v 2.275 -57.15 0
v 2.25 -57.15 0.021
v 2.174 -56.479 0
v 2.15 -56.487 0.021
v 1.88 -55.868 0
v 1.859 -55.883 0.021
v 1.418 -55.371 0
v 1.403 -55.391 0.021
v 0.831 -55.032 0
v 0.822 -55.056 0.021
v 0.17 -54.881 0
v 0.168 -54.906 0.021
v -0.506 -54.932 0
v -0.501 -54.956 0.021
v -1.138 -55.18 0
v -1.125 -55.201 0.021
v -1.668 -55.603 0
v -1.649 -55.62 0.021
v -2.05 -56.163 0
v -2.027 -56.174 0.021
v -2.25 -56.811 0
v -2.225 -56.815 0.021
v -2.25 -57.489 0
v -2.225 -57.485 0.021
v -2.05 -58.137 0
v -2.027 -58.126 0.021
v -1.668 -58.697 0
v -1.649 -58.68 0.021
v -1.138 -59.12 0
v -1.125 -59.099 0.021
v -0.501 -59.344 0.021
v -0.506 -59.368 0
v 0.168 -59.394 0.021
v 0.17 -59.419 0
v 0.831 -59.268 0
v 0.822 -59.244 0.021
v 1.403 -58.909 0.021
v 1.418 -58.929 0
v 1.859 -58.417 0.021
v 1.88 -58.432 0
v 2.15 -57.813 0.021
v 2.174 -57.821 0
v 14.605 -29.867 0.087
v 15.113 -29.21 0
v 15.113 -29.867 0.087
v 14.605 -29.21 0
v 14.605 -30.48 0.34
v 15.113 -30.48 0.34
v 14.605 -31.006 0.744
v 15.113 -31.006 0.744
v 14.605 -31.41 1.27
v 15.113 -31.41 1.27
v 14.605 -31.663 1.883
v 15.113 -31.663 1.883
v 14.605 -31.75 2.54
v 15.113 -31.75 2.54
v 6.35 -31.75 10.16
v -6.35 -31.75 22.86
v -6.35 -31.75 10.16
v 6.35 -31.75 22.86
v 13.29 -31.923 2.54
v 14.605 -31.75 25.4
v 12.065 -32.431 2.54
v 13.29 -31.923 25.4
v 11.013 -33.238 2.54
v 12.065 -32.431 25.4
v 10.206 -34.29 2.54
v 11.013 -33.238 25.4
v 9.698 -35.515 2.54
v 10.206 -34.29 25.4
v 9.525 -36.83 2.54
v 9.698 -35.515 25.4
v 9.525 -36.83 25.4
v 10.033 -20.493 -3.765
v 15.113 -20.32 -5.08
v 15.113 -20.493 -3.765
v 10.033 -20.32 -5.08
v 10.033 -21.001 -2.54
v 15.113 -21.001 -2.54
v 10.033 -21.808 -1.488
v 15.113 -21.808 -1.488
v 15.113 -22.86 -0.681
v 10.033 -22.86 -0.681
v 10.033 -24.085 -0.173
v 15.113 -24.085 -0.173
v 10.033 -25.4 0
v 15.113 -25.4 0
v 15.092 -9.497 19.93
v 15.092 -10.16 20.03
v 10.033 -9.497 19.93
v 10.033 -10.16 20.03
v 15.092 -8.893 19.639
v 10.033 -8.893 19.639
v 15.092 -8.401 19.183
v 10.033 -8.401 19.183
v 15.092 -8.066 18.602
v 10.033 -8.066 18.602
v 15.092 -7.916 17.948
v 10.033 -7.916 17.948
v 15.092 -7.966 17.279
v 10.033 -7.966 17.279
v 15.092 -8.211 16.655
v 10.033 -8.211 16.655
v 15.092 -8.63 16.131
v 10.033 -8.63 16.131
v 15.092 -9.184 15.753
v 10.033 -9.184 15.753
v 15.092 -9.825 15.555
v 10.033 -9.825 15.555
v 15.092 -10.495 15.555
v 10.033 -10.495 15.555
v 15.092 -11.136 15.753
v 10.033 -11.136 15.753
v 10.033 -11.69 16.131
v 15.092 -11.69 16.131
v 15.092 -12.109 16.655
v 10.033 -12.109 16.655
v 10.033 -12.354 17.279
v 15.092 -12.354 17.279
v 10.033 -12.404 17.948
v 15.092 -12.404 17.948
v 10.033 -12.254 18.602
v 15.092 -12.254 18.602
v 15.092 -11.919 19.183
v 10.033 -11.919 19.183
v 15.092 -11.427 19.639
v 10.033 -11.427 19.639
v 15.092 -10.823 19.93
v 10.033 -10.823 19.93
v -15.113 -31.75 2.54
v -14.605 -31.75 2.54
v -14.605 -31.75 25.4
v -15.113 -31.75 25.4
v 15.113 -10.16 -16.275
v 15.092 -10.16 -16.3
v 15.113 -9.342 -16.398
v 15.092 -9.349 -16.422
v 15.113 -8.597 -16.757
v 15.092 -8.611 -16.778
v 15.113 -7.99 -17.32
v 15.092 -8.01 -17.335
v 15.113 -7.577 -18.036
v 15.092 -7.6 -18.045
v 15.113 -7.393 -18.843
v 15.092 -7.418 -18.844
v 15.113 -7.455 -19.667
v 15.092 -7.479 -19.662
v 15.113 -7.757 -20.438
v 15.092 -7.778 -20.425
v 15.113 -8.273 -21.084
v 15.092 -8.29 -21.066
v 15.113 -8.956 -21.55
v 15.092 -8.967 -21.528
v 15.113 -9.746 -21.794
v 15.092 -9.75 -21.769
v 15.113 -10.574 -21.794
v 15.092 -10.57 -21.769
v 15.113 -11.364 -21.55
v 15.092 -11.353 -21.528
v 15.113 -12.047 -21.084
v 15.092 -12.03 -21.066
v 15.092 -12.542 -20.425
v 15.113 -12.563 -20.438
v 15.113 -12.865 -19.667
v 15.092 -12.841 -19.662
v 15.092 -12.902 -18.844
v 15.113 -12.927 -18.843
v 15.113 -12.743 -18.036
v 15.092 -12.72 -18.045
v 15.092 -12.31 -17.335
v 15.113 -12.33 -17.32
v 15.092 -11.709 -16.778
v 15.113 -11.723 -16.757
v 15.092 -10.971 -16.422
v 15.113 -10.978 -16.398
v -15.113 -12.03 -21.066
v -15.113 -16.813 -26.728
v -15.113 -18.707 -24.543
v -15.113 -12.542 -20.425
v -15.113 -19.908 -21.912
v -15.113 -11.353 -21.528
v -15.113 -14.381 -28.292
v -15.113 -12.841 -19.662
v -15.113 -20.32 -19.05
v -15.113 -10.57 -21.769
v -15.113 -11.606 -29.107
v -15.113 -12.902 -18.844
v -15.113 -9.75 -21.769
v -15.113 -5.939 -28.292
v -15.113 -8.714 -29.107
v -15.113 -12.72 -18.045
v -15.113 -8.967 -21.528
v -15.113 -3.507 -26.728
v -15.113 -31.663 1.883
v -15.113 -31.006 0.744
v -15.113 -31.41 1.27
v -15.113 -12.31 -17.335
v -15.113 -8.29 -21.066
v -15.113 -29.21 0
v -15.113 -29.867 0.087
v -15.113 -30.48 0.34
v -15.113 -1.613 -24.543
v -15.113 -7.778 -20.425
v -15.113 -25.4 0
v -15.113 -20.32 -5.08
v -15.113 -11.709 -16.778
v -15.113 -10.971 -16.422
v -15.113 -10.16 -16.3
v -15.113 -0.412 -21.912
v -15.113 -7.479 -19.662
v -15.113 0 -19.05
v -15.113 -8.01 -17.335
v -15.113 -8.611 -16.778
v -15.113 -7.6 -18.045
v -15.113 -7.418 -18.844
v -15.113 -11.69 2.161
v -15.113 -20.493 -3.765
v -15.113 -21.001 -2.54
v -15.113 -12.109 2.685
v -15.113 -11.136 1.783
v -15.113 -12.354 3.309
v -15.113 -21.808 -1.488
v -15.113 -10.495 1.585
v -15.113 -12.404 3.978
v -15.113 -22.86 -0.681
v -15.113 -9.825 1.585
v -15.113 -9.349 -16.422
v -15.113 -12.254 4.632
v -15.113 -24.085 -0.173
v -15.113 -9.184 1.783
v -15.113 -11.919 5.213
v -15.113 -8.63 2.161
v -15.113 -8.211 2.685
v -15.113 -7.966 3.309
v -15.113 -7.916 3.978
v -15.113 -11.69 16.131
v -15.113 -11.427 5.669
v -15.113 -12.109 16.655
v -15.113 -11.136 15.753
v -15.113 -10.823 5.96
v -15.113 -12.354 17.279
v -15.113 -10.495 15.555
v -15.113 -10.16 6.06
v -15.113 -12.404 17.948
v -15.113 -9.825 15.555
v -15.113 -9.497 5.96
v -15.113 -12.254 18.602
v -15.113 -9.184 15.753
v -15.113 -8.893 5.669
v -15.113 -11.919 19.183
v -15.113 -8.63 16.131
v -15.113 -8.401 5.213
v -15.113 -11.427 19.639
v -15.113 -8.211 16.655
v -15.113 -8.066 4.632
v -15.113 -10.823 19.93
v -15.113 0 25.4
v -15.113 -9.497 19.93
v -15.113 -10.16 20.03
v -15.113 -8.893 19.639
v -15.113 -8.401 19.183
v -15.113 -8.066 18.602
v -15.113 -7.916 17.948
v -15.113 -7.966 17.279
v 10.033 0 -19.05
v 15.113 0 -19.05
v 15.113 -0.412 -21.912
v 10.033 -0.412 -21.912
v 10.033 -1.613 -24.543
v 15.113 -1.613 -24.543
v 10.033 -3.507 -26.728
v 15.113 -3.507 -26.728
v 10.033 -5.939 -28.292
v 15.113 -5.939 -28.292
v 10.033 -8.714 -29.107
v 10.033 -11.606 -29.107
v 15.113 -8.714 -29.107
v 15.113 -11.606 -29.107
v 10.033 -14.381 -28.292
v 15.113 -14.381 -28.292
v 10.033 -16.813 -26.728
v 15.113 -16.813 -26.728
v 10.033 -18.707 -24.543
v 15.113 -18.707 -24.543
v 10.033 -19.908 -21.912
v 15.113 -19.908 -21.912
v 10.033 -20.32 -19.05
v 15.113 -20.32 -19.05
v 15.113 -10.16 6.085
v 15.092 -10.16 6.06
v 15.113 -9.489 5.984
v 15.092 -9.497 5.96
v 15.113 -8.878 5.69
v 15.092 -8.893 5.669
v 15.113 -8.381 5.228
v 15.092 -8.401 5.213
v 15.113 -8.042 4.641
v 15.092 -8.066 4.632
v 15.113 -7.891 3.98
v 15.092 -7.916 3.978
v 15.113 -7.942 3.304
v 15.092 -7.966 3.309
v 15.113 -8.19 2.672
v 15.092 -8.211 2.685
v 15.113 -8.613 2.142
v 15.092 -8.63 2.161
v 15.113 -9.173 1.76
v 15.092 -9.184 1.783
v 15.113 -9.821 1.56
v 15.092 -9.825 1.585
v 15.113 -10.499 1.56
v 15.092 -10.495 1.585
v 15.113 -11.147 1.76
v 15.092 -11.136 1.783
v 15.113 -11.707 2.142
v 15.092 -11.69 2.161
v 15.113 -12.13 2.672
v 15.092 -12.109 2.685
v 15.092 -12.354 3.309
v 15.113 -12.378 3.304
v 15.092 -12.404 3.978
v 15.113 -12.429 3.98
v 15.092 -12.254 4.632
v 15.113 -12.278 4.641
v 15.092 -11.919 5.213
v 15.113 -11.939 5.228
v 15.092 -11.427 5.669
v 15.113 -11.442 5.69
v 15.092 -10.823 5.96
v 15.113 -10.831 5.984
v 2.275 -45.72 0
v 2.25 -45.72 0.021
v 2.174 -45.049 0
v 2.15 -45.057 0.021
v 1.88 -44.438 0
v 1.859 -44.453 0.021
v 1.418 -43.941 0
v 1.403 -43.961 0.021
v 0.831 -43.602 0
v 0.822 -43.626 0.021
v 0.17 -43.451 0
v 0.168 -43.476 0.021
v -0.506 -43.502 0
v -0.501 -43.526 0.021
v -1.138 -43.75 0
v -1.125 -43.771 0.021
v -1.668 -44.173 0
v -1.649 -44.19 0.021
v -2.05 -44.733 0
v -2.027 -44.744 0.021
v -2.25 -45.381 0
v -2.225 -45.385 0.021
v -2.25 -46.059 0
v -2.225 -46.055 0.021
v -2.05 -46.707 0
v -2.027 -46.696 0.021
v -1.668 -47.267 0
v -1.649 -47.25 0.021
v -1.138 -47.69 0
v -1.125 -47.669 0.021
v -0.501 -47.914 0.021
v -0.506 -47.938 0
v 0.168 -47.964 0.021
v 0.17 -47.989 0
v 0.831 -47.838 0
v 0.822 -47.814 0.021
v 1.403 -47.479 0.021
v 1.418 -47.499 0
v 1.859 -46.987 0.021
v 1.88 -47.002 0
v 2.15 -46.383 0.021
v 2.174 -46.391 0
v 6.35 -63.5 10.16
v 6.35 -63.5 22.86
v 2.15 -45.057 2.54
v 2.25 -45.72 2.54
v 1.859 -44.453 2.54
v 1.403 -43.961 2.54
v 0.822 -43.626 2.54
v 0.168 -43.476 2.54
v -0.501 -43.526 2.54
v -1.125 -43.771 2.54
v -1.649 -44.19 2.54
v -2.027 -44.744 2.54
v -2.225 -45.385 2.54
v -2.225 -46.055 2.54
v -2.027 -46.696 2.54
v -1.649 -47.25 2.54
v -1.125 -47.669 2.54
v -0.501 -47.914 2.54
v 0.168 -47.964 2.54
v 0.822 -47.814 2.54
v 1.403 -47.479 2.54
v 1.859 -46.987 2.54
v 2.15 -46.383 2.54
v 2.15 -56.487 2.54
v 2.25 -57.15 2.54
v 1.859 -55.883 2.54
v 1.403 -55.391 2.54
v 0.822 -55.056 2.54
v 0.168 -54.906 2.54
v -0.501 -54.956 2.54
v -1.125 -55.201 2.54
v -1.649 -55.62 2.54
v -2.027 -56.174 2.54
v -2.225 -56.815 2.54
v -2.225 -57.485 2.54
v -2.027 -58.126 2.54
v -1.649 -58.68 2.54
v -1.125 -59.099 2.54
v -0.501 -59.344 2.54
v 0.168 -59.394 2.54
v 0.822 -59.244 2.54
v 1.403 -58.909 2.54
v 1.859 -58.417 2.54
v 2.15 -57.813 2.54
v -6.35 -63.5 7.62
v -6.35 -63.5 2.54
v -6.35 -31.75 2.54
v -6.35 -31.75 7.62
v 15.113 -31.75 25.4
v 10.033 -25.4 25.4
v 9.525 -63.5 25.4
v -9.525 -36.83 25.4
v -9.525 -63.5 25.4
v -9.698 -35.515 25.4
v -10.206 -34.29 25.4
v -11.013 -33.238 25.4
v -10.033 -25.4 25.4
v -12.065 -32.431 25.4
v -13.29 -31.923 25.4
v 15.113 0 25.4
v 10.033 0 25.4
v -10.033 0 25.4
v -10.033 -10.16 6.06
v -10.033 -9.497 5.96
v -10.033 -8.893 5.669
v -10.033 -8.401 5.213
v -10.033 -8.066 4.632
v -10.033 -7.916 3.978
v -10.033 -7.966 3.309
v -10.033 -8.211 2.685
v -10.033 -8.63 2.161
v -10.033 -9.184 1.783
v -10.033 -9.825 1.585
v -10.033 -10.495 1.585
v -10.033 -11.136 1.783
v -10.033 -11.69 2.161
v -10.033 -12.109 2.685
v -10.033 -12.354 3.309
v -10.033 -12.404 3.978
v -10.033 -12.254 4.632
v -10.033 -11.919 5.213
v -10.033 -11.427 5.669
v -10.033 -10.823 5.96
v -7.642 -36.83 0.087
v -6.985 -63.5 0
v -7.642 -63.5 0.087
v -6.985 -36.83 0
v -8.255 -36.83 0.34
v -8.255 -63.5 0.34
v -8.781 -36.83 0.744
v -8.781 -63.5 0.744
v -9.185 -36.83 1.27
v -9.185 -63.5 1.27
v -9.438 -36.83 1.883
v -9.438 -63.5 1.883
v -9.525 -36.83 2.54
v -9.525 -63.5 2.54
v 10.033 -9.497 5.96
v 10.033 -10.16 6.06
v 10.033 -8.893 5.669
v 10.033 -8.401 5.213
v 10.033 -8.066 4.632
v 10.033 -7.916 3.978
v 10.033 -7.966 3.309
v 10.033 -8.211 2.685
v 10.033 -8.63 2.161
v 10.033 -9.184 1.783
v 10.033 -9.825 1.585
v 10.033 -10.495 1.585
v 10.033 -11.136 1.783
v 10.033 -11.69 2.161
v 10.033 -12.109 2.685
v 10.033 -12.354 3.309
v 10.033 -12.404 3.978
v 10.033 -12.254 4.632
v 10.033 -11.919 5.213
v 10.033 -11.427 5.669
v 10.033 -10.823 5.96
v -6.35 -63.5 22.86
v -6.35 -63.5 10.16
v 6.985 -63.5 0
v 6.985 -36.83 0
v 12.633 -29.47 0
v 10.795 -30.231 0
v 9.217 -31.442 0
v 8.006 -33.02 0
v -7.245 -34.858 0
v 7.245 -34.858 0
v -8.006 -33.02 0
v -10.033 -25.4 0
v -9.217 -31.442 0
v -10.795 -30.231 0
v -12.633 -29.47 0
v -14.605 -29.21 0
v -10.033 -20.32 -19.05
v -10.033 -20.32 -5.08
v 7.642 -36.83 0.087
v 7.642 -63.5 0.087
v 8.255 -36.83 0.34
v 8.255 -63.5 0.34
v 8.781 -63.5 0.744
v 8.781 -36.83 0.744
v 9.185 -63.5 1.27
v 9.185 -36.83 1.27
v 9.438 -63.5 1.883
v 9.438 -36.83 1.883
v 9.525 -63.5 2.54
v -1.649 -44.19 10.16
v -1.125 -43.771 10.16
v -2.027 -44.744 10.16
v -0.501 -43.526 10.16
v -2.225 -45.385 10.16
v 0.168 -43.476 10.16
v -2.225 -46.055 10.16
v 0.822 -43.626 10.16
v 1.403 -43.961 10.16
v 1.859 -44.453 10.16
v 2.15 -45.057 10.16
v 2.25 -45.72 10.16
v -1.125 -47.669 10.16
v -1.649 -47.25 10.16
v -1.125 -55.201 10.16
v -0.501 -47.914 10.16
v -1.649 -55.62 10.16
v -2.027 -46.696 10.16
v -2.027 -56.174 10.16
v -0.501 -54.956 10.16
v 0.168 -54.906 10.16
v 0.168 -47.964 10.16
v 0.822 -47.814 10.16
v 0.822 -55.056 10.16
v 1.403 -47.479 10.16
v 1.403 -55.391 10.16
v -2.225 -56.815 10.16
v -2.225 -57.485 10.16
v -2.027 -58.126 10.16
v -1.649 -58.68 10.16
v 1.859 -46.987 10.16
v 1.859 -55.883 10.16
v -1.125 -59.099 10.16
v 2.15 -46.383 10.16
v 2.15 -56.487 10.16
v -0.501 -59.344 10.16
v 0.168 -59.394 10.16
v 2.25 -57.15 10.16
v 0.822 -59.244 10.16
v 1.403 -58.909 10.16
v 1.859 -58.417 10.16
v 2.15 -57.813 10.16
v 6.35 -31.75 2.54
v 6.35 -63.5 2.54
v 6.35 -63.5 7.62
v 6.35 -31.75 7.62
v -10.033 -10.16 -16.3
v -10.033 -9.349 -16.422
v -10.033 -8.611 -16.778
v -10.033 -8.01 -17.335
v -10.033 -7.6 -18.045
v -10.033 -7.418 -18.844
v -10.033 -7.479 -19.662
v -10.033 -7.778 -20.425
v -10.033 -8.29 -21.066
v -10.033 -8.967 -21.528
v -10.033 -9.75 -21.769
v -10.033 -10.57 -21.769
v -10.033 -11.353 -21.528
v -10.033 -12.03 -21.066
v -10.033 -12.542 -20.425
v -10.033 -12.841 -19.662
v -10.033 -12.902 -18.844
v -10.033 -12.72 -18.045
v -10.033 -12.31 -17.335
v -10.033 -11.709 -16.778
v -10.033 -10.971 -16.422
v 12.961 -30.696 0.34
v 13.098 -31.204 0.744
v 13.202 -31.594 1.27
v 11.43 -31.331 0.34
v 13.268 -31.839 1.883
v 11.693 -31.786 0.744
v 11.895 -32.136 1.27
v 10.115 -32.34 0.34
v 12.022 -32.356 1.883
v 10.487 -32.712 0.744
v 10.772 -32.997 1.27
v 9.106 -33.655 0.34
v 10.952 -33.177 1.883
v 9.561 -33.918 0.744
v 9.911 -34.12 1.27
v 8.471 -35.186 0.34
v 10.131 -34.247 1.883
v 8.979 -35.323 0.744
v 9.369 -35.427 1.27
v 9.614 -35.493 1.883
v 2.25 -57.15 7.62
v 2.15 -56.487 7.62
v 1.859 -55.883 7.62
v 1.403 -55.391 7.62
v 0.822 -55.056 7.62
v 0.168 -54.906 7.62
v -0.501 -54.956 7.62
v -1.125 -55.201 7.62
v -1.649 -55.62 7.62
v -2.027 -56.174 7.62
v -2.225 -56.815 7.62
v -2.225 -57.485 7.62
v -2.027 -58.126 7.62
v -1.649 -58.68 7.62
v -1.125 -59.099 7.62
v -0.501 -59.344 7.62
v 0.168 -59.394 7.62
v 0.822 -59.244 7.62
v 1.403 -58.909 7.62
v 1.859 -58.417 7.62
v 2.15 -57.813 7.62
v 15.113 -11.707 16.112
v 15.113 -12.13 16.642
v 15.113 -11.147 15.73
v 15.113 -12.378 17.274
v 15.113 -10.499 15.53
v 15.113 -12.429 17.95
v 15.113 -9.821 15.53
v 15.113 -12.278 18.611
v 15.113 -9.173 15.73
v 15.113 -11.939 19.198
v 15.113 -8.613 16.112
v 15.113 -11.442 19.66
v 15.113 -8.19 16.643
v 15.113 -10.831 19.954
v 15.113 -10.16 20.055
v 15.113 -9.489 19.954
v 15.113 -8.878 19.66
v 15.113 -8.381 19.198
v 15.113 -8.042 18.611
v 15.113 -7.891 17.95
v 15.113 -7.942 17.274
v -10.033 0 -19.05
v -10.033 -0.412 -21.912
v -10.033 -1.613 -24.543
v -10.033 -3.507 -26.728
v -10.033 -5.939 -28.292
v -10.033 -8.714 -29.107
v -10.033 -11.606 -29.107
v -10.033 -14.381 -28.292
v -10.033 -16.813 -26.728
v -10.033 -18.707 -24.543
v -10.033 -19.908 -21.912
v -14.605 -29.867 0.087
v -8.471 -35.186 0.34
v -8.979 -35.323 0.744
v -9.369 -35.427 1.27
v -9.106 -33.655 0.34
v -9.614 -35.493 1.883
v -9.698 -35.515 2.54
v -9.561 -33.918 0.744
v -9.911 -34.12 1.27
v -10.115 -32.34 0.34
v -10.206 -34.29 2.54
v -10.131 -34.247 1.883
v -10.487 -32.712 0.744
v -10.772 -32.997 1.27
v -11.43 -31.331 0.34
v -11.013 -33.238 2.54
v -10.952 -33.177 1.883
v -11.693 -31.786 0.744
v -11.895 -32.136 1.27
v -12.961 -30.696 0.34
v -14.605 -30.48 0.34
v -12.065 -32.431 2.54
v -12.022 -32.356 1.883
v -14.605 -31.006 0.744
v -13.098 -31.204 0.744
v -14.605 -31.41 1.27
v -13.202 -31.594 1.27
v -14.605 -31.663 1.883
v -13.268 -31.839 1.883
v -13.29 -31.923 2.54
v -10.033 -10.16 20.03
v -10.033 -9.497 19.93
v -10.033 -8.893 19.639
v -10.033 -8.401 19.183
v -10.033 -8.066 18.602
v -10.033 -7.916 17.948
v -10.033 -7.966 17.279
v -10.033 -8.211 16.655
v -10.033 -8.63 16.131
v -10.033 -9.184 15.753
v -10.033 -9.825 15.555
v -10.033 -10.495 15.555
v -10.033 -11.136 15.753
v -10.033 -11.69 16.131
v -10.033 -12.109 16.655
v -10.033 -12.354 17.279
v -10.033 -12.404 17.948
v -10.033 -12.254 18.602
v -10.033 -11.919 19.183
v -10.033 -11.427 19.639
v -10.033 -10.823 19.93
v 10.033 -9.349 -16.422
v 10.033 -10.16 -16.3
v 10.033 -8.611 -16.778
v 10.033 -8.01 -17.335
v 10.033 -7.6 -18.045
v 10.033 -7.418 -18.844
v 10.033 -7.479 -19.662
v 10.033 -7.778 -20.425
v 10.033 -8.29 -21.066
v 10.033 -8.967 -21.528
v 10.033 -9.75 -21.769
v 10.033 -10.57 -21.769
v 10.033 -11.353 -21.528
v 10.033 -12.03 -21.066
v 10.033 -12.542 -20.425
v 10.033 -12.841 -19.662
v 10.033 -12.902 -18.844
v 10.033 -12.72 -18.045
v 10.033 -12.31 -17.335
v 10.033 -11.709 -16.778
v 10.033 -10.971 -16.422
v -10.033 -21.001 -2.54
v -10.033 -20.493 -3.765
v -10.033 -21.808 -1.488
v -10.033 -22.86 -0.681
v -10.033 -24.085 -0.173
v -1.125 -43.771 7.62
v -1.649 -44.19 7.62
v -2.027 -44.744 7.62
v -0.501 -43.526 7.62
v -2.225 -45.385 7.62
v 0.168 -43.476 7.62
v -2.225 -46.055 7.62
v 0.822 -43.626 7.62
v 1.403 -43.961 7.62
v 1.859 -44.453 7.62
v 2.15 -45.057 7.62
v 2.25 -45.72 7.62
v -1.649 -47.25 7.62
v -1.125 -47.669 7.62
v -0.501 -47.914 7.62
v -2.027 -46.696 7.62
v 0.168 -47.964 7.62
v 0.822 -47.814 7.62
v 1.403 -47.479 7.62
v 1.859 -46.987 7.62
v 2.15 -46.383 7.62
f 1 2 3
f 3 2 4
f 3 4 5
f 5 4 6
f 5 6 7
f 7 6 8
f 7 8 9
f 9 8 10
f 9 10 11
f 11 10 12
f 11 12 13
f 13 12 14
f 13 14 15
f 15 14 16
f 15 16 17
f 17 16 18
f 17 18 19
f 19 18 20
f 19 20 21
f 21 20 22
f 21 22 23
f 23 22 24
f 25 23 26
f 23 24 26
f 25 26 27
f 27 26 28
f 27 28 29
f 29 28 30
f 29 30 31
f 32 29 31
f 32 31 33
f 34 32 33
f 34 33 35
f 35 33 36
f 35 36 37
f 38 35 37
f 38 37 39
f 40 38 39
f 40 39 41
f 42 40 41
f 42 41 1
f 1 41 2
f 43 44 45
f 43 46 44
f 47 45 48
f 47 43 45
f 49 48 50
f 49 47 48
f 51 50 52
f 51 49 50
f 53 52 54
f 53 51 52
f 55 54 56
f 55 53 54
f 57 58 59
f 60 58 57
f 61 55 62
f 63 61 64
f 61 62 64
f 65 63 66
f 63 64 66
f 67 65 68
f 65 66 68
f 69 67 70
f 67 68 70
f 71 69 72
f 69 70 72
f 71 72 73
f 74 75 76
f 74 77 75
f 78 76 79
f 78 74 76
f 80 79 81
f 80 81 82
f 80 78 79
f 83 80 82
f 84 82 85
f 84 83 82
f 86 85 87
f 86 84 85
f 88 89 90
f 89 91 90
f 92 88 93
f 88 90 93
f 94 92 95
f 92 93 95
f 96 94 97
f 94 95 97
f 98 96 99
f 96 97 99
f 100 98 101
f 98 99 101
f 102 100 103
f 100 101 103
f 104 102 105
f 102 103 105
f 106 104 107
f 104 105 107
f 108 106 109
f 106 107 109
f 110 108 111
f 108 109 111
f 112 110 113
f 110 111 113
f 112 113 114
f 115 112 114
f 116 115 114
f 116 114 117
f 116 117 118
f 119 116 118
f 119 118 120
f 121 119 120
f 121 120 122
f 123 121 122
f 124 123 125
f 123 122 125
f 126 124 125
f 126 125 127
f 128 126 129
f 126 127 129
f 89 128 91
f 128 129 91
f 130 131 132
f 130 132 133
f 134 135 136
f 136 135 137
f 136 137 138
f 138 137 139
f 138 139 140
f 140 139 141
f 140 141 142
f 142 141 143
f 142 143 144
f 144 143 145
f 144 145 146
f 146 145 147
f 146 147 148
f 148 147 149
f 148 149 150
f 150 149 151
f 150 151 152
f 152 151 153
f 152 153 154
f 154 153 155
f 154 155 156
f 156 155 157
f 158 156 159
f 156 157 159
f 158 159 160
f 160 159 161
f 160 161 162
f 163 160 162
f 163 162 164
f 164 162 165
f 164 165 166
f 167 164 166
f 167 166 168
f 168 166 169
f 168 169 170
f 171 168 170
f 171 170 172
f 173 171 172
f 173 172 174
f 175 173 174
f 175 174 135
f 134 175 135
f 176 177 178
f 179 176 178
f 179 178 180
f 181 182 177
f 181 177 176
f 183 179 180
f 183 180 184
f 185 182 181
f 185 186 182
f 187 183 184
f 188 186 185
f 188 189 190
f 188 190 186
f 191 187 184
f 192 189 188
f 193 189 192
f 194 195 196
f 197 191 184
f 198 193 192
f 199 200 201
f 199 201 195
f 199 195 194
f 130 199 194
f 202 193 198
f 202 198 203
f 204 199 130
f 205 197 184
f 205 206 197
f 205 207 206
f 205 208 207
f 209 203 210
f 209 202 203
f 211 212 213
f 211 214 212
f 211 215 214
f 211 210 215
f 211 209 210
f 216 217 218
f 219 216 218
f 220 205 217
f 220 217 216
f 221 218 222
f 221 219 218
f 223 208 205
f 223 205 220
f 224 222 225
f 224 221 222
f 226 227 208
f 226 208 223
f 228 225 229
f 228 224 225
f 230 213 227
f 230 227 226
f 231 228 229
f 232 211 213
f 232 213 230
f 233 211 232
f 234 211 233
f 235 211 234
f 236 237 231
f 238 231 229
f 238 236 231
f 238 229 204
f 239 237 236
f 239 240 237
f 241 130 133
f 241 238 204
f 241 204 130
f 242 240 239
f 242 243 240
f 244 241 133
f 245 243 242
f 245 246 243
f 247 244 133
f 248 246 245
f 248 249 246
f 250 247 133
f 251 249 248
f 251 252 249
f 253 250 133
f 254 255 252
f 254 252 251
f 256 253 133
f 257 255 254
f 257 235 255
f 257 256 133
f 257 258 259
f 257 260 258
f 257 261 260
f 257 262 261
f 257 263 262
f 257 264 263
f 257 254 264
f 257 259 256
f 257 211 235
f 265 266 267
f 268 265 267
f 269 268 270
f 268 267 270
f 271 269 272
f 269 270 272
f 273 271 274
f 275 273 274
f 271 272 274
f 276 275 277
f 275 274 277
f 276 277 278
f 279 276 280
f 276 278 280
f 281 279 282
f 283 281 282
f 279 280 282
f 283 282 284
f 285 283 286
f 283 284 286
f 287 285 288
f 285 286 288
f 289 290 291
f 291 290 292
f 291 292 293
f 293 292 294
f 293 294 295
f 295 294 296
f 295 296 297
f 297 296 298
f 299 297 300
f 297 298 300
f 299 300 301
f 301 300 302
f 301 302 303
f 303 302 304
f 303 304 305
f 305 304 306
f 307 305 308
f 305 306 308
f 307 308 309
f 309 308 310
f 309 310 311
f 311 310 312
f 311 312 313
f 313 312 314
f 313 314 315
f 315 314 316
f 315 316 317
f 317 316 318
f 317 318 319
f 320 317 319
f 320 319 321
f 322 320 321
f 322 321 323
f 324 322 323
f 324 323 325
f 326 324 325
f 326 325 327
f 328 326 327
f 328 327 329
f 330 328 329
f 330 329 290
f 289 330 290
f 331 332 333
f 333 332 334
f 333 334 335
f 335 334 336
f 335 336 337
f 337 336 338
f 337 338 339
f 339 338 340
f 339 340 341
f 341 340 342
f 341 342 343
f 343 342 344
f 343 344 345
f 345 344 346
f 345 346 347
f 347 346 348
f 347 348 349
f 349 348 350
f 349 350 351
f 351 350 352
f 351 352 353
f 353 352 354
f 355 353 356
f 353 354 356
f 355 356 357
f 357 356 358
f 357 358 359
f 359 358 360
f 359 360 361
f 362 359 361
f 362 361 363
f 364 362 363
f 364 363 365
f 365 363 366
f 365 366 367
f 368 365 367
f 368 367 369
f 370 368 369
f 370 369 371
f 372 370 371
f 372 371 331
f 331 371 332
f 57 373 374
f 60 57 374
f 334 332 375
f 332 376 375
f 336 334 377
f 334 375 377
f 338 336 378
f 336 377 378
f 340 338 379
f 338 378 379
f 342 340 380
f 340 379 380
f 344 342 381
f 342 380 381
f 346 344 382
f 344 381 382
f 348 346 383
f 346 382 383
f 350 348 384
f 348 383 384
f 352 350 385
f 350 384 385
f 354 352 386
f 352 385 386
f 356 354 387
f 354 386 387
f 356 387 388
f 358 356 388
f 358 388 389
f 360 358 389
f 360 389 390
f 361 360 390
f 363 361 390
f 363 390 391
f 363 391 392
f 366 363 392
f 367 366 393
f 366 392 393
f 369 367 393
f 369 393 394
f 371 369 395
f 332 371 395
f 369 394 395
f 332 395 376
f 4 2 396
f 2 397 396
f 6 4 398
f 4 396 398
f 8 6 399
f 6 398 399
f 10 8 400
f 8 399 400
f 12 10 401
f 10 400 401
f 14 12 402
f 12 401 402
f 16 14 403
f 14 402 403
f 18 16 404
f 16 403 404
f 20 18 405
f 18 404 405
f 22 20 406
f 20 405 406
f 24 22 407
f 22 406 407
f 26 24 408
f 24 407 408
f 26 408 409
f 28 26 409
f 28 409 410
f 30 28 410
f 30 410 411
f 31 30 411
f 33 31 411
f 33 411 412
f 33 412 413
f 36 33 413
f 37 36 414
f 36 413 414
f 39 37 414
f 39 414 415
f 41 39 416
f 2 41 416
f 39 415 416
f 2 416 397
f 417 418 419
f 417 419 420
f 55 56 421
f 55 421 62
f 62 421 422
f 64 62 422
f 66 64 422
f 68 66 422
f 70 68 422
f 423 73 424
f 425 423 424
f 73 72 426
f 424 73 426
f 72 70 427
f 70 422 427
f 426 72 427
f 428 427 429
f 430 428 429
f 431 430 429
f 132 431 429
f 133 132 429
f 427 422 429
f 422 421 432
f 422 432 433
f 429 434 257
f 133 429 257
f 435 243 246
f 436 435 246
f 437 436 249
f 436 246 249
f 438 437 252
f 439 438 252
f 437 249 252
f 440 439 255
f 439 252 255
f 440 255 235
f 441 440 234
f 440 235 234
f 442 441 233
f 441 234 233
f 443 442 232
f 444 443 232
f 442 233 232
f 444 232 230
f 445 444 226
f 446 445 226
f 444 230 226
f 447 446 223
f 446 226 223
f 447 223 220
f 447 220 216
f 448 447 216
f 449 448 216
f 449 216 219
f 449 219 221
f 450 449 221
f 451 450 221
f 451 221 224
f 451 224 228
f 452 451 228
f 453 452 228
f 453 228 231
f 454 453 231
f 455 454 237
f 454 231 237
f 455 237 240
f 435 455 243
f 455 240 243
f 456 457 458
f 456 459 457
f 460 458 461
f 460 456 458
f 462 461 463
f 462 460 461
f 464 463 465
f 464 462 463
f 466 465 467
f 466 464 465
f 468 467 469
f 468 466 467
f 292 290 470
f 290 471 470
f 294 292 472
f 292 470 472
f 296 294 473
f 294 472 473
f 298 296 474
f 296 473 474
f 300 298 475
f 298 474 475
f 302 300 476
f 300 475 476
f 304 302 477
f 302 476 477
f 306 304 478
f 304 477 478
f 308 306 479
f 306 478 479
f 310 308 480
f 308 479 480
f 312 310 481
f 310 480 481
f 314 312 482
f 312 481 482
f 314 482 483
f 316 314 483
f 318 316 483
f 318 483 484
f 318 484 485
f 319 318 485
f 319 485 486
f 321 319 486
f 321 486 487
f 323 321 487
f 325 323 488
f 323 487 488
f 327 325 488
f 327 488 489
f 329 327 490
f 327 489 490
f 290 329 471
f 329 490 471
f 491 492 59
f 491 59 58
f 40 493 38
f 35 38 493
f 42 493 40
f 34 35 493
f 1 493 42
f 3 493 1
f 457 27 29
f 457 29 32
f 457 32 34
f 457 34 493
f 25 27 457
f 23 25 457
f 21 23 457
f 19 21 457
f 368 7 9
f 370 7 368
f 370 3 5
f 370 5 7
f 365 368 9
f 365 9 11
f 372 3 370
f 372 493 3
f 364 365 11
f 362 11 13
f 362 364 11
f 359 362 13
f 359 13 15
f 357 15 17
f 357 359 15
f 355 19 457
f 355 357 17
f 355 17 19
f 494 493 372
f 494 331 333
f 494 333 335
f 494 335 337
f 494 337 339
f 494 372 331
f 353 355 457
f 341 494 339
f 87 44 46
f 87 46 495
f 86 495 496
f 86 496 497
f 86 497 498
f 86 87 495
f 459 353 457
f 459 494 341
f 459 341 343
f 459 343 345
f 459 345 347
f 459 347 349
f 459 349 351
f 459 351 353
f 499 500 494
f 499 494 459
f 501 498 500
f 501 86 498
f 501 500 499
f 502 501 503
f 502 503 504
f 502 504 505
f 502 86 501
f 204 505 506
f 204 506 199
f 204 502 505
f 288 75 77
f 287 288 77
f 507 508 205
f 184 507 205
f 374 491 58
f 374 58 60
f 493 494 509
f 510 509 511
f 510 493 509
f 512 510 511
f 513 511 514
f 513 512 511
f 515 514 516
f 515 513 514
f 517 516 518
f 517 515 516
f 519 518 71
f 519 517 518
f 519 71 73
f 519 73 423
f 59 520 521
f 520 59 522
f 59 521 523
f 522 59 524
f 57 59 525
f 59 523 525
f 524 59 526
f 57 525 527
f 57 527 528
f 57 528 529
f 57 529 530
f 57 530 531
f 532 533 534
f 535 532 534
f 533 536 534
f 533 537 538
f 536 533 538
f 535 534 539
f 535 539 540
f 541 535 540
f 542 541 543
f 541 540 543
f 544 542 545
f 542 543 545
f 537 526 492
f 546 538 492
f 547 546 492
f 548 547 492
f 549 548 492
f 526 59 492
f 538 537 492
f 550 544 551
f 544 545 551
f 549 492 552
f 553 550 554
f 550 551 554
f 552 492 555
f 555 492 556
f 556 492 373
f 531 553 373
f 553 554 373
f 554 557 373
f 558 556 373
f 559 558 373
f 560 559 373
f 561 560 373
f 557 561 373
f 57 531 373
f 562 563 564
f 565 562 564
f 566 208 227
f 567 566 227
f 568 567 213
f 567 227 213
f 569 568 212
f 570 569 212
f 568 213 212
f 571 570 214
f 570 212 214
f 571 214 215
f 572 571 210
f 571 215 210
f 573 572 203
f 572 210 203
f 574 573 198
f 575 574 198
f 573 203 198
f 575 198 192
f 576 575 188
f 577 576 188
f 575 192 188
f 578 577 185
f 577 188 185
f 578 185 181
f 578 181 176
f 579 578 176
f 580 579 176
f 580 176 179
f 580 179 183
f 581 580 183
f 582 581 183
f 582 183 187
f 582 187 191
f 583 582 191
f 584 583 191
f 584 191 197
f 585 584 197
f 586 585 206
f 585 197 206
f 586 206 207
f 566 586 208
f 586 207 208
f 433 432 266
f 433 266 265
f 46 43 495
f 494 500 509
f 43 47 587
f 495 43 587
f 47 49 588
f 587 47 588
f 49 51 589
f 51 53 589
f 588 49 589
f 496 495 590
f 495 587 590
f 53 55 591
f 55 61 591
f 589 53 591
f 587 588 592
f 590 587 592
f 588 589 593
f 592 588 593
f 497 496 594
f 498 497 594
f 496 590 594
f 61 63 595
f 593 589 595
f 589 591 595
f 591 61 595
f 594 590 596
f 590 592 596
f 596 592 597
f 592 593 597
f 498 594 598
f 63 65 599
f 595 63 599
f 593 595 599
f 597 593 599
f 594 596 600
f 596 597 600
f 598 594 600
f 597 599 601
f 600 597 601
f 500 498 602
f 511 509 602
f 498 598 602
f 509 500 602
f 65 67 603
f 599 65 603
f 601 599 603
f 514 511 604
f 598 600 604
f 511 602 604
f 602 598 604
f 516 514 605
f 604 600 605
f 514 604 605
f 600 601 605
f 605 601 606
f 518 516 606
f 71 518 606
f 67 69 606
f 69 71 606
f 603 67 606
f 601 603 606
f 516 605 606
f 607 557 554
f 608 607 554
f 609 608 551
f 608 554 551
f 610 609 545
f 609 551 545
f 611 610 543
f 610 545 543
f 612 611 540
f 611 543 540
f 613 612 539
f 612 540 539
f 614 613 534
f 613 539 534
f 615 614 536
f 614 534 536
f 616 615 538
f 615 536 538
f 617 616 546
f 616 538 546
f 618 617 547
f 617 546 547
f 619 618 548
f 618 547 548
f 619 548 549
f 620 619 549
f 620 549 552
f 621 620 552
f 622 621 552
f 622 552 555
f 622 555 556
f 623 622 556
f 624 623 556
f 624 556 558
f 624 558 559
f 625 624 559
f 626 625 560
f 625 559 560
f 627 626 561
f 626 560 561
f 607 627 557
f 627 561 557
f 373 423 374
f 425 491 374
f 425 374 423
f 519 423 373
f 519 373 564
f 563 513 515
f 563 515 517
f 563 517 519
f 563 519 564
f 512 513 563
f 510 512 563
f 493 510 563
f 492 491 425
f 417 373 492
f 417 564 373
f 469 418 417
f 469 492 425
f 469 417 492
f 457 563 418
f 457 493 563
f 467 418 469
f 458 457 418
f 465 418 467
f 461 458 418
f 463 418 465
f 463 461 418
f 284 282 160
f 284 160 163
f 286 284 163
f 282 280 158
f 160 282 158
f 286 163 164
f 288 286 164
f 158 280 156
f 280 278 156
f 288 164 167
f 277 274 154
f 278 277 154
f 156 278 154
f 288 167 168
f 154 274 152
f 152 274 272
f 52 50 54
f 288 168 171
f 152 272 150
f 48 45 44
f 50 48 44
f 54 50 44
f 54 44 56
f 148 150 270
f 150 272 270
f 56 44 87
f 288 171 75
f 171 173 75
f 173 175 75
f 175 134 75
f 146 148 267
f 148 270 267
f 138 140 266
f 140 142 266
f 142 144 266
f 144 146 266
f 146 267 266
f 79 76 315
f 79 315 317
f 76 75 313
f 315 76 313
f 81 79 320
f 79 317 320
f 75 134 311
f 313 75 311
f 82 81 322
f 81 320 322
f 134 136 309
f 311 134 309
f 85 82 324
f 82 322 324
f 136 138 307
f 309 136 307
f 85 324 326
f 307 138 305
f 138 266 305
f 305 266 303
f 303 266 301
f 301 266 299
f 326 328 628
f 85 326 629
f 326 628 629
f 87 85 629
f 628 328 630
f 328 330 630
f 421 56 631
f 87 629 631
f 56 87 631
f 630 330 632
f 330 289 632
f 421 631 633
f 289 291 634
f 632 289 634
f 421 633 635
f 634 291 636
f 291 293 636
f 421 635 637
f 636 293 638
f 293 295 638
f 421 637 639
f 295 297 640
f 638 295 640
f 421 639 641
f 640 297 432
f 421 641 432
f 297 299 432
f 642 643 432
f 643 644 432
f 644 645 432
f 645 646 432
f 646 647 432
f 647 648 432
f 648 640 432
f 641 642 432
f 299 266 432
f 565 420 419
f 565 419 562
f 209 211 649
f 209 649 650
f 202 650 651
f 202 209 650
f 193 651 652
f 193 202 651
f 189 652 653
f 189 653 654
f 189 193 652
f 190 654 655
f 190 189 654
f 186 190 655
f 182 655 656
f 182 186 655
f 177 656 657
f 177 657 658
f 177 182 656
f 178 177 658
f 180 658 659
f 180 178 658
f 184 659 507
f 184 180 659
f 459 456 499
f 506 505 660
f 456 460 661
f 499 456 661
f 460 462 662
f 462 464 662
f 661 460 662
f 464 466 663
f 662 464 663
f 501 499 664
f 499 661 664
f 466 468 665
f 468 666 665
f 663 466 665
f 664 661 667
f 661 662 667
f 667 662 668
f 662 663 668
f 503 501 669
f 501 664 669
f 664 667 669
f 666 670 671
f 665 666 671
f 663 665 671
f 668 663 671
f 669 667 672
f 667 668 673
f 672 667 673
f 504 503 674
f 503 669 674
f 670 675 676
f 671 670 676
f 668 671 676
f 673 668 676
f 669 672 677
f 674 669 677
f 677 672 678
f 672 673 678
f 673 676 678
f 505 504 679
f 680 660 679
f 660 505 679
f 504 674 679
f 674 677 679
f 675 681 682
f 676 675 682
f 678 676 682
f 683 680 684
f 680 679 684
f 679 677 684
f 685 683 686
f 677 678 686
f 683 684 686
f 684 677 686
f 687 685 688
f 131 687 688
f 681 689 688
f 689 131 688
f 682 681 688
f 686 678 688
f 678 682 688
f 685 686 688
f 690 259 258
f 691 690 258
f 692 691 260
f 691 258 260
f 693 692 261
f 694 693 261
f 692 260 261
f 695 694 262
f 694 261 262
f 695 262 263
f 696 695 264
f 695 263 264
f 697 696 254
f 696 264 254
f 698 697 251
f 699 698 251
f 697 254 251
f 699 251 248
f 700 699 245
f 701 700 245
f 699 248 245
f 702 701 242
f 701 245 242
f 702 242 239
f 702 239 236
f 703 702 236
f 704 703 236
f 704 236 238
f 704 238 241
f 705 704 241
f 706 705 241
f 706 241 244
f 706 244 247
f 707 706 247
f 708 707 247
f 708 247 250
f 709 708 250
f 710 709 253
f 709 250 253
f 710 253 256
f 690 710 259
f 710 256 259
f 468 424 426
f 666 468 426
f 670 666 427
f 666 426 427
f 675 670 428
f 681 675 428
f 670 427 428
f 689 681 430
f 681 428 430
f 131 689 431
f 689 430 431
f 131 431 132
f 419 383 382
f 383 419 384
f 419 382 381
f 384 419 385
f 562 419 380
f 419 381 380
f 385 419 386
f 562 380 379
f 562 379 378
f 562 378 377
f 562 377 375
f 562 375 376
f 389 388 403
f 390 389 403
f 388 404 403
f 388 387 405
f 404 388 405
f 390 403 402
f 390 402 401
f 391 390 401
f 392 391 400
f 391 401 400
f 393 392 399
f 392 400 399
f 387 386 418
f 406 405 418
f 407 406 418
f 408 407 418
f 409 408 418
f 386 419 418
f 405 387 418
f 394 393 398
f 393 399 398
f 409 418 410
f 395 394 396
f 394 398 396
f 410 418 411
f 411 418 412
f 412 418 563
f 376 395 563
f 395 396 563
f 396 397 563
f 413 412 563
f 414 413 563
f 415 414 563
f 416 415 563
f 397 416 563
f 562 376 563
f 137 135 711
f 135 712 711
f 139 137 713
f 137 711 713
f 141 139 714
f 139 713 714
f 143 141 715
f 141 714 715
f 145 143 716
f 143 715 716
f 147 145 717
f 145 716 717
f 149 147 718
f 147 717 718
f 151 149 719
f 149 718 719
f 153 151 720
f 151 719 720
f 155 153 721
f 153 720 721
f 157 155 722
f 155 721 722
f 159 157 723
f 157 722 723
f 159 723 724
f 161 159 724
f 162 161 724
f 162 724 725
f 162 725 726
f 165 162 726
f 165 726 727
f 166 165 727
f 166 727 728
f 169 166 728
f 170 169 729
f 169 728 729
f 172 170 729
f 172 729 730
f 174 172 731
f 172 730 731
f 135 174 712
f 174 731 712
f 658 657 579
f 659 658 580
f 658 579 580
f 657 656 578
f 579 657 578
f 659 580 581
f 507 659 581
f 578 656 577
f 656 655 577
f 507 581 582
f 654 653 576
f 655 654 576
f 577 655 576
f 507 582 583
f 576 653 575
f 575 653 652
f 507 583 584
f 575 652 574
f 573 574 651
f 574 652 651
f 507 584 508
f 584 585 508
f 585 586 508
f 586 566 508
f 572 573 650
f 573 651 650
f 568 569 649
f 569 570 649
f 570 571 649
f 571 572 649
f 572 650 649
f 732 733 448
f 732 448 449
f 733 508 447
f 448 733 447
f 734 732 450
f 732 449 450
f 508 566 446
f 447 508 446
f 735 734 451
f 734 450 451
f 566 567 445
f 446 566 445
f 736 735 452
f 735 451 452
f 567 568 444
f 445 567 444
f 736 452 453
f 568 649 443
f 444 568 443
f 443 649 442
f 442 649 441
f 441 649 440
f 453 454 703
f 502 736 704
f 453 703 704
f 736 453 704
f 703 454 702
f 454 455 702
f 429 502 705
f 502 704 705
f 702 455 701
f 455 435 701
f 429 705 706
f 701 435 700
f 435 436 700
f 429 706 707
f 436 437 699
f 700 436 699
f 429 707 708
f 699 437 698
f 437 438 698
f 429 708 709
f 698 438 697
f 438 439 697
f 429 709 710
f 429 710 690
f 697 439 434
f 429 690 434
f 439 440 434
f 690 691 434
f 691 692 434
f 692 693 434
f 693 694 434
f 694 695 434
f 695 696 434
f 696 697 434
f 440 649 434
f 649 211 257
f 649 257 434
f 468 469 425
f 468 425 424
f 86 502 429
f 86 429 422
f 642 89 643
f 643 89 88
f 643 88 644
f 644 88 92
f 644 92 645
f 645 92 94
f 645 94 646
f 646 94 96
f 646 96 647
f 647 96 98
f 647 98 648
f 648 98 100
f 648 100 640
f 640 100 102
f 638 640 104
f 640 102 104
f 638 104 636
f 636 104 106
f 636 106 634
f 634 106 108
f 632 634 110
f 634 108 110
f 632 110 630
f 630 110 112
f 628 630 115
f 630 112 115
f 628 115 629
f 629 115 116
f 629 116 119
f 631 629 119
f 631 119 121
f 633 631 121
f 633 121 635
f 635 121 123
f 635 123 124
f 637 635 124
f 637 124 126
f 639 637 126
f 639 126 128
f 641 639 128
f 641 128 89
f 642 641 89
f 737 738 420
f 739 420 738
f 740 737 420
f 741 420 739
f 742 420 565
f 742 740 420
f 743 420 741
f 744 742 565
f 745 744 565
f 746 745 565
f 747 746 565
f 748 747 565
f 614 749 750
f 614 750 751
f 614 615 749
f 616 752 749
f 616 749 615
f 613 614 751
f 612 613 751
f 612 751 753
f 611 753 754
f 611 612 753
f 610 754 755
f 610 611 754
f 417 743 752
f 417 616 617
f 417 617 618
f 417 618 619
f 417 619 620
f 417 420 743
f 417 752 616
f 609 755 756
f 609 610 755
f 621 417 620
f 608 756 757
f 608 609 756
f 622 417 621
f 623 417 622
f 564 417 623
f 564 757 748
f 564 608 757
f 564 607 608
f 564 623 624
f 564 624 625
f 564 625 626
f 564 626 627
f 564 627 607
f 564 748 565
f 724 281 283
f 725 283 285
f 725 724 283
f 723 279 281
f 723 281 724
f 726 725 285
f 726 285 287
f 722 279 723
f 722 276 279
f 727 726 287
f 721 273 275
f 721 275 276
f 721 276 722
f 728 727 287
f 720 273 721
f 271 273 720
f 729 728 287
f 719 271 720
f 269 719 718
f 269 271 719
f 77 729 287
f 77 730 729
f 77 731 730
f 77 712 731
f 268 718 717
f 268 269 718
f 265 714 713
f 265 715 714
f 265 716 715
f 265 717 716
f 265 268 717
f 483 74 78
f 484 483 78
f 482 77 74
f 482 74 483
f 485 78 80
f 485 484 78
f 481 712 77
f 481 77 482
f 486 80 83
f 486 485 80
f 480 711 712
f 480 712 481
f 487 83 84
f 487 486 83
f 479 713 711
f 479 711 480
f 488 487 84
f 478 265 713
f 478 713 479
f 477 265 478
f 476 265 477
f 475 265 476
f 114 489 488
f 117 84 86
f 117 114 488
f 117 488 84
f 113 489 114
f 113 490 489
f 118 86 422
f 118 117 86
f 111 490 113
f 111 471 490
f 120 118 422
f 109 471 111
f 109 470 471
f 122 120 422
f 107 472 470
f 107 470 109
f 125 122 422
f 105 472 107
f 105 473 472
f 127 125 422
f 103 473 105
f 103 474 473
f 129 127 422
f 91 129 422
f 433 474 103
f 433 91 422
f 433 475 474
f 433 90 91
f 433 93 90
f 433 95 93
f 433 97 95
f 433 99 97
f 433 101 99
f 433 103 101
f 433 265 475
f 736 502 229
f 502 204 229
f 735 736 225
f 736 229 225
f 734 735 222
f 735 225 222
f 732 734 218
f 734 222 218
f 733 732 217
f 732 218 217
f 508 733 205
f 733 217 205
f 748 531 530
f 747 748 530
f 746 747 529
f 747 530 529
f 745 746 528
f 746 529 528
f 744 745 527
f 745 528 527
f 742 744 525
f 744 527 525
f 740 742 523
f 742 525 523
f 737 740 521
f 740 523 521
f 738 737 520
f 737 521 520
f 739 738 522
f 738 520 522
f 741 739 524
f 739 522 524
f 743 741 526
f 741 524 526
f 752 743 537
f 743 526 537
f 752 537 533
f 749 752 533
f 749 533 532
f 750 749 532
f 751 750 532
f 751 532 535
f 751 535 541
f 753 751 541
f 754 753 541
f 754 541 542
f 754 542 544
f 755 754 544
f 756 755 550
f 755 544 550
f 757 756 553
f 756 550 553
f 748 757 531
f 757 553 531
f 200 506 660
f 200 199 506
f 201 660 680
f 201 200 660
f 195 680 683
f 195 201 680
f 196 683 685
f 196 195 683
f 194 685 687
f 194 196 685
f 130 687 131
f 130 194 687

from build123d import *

# Parameters (mm, degrees)
BOSS_EXTRUDE1_DEPTH            = 25.4
SKETCH2_W                      = 12.7
SKETCH2_H                      = 12.7
SKETCH2_H_2                    = 5.08
CUT_EXTRUDE1_DEPTH             = 31.75
M4_CLEARANCE_HOLE4_D           = 4.5
M4_CLEARANCE_HOLE4_DEPTH       = 10.16
M4_CLEARANCE_HOLE4_CSINK_D     = 4.55
M4_CLEARANCE_HOLE4_CSINK_ANGLE = 100
M4_CLEARANCE_HOLE4_TIP         = 1.351936393
SKETCH6_W                      = 5.08
SKETCH6_H                      = 20.32
BOSS_EXTRUDE2_DEPTH            = 19.05
BOSS_EXTRUDE3_DEPTH            = 5.08
BOSS_EXTRUDE4_DEPTH            = 5.08
M4_CLEARANCE_HOLE5_D           = 4.5
M4_CLEARANCE_HOLE5_DEPTH       = 30.226
M4_CLEARANCE_HOLE5_CSINK_D     = 4.55
M4_CLEARANCE_HOLE5_CSINK_ANGLE = 100
M4_CLEARANCE_HOLE5_TIP         = 1.351936393
M5_CLEARANCE_HOLE1_D           = 5.5
M5_CLEARANCE_HOLE1_DEPTH       = 30.226
M5_CLEARANCE_HOLE1_CSINK_D     = 5.55
M5_CLEARANCE_HOLE1_CSINK_ANGLE = 100
M5_CLEARANCE_HOLE1_TIP         = 1.652366702
FILLET1_R                      = 5.08
FILLET2_R                      = 2.54


with BuildPart() as part:
    # Sketch1 → Boss-Extrude1 (new body)
    with BuildSketch(Plane.XY):
        Polygon((-15.113, 0), (-10.033, 0), (-10.033, -25.4), (10.033, -25.4), (10.033, 0), (15.113, 0), (15.113, -31.75), (9.525, -31.75), (9.525, -63.5), (-9.525, -63.5), (-9.525, -31.75), (-15.113, -31.75), align=None)
    extrude(amount=BOSS_EXTRUDE1_DEPTH)

    # Sketch2 → Cut-Extrude1 (cut)
    with BuildSketch(Plane.XZ.offset(63.5)):
        with Locations((0, 16.51)):
            Rectangle(SKETCH2_W, SKETCH2_H)
        with Locations((0, 5.08)):
            Rectangle(SKETCH2_W, SKETCH2_H_2)
    extrude(amount=-CUT_EXTRUDE1_DEPTH, mode=Mode.SUBTRACT)

    # M4 Clearance Hole4
    with Locations(Plane(origin=(0, 0, 0), x_dir=(-1, 0, 0), z_dir=(0, 0, -1))):
        with Locations((0, -57.15), (0, -45.72)):
            CounterSinkHole(M4_CLEARANCE_HOLE4_D / 2, M4_CLEARANCE_HOLE4_CSINK_D / 2, depth=M4_CLEARANCE_HOLE4_DEPTH, counter_sink_angle=M4_CLEARANCE_HOLE4_CSINK_ANGLE)
            with Locations((0, 0, -(M4_CLEARANCE_HOLE4_DEPTH + M4_CLEARANCE_HOLE4_TIP / 2))):  # 118° drill point
                Cone(0, M4_CLEARANCE_HOLE4_D / 2, M4_CLEARANCE_HOLE4_TIP, mode=Mode.SUBTRACT)

    # Sketch6 → Boss-Extrude2 (add)
    with BuildSketch(Plane(origin=(0, 0, 0), x_dir=(-1, 0, 0), z_dir=(0, 0, -1))):
        with Locations((-12.573, -10.16)):
            Rectangle(SKETCH6_W, SKETCH6_H)
        with Locations((12.573, -10.16)):
            Rectangle(SKETCH6_W, SKETCH6_H)
    extrude(amount=BOSS_EXTRUDE2_DEPTH)

    # Sketch7 → Boss-Extrude3 (add)
    with BuildSketch(Plane(origin=(15.113, 0, 0), x_dir=(0, 0, -1), z_dir=(1, 0, 0))):
        with BuildLine():
            Line((19.05, -20.32), (19.05, 0))
            ThreePointArc((19.05, 0), (29.21, -10.16), (19.05, -20.32))
        make_face()
    extrude(amount=-BOSS_EXTRUDE3_DEPTH)

    # Sketch8 → Boss-Extrude4 (add)
    with BuildSketch(Plane.ZY.offset(15.113)):
        with BuildLine():
            Line((-19.05, -20.32), (-19.05, 0))
            ThreePointArc((-19.05, 0), (-29.21, -10.16), (-19.05, -20.32))
        make_face()
    extrude(amount=-BOSS_EXTRUDE4_DEPTH)

    # M4 Clearance Hole5
    with Locations(Plane(origin=(15.113, 0, 0), x_dir=(0, 0, -1), z_dir=(1, 0, 0))):
        with Locations((-17.78, -10.16), (-3.81, -10.16)):
            CounterSinkHole(M4_CLEARANCE_HOLE5_D / 2, M4_CLEARANCE_HOLE5_CSINK_D / 2, depth=M4_CLEARANCE_HOLE5_DEPTH, counter_sink_angle=M4_CLEARANCE_HOLE5_CSINK_ANGLE)
            with Locations((0, 0, -(M4_CLEARANCE_HOLE5_DEPTH + M4_CLEARANCE_HOLE5_TIP / 2))):  # 118° drill point
                Cone(0, M4_CLEARANCE_HOLE5_D / 2, M4_CLEARANCE_HOLE5_TIP, mode=Mode.SUBTRACT)

    # M5 Clearance Hole1
    with Locations(Plane(origin=(15.113, 0, 0), x_dir=(0, 0, -1), z_dir=(1, 0, 0))):
        with Locations((19.05, -10.16)):
            CounterSinkHole(M5_CLEARANCE_HOLE1_D / 2, M5_CLEARANCE_HOLE1_CSINK_D / 2, depth=M5_CLEARANCE_HOLE1_DEPTH, counter_sink_angle=M5_CLEARANCE_HOLE1_CSINK_ANGLE)
            with Locations((0, 0, -(M5_CLEARANCE_HOLE1_DEPTH + M5_CLEARANCE_HOLE1_TIP / 2))):  # 118° drill point
                Cone(0, M5_CLEARANCE_HOLE1_D / 2, M5_CLEARANCE_HOLE1_TIP, mode=Mode.SUBTRACT)

    # Fillet1
    fillet1_edges = [part.edges().sort_by_distance(p)[0] for p in [
        (12.573, -20.32, 0),
        (-12.573, -20.32, 0),
        (-9.525, -31.75, 12.7),
        (9.525, -31.75, 12.7),
    ]]
    fillet(fillet1_edges, radius=FILLET1_R)

    # Fillet2
    fillet2_edges = [part.edges().sort_by_distance(p)[0] for p in [
        (9.525, -50.165, 0),
        (14.859, -31.75, 0),
        (-9.525, -50.165, 0),
        (-14.859, -31.75, 0),
        (-11.012897552, -33.237897552, 0),
        (11.012897552, -33.237897552, 0),
    ]]
    fillet(fillet2_edges, radius=FILLET2_R)


solid = part.part
